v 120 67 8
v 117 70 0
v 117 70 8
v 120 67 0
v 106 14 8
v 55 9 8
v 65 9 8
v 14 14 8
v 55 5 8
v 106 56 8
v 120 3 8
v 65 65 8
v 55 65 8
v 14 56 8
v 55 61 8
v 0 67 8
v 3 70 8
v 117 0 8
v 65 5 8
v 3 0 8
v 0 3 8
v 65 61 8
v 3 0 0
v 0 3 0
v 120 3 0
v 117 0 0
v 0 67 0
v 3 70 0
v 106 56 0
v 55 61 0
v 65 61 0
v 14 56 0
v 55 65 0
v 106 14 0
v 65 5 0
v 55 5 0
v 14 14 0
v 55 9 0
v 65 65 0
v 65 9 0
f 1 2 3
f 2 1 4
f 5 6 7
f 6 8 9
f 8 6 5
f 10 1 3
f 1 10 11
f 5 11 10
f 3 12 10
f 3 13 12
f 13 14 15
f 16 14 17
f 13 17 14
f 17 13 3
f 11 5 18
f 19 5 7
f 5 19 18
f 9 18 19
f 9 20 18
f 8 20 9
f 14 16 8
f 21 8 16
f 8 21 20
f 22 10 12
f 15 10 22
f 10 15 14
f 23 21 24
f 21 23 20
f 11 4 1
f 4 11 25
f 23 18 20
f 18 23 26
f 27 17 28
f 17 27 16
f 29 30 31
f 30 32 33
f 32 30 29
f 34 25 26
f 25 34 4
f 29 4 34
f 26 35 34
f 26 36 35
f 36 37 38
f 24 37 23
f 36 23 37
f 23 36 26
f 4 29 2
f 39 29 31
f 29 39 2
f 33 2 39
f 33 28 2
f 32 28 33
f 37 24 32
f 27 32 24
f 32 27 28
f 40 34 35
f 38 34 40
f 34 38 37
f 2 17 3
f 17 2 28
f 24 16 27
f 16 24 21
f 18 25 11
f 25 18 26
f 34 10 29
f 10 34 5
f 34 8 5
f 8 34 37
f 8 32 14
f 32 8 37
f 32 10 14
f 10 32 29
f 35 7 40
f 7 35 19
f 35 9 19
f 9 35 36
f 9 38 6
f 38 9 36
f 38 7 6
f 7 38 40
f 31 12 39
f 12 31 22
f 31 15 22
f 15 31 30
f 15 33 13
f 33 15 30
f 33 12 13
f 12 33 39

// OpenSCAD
$fn = 32;

// ----------------------------------------------------------------------
// Frame plate: 120 x 70 frame, 14 mm rails
// ----------------------------------------------------------------------

// --- parameters (mm) ---
plate_l = 120;            // plate length, X
plate_w = 70;             // plate width, Y
plate_t = 8;              // plate thickness, Z (extrusion height)
corner_c = 3;             // corner chamfer
frame_bar = 14;           // frame rail width
slot_l = 10;              // adjustment slot length
slot_w = 4;               // adjustment slot width

win_l = plate_l - 2 * frame_bar;  // window length
win_w = plate_w - 2 * frame_bar;  // window width

profile = [[3, 0], [117, 0], [120, 3], [120, 67], [117, 70], [3, 70], [0, 67], [0, 3]];  // primary outline, 8 points, counter clockwise
void_1 = [[14, 14], [106, 14], [106, 56], [14, 56]];  // the window, 4 points
void_2 = [[55, 5], [65, 5], [65, 9], [55, 9]];  // adjustment slot, 4 points
void_3 = [[55, 61], [65, 61], [65, 65], [55, 65]];  // adjustment slot, 4 points

// --- the one profile operation ---
difference() {
  linear_extrude(height = plate_t) polygon(points = profile);
  translate([0, 0, -1])
    linear_extrude(height = plate_t + 2) polygon(points = void_1);
  translate([0, 0, -1])
    linear_extrude(height = plate_t + 2) polygon(points = void_2);
  translate([0, 0, -1])
    linear_extrude(height = plate_t + 2) polygon(points = void_3);
}
